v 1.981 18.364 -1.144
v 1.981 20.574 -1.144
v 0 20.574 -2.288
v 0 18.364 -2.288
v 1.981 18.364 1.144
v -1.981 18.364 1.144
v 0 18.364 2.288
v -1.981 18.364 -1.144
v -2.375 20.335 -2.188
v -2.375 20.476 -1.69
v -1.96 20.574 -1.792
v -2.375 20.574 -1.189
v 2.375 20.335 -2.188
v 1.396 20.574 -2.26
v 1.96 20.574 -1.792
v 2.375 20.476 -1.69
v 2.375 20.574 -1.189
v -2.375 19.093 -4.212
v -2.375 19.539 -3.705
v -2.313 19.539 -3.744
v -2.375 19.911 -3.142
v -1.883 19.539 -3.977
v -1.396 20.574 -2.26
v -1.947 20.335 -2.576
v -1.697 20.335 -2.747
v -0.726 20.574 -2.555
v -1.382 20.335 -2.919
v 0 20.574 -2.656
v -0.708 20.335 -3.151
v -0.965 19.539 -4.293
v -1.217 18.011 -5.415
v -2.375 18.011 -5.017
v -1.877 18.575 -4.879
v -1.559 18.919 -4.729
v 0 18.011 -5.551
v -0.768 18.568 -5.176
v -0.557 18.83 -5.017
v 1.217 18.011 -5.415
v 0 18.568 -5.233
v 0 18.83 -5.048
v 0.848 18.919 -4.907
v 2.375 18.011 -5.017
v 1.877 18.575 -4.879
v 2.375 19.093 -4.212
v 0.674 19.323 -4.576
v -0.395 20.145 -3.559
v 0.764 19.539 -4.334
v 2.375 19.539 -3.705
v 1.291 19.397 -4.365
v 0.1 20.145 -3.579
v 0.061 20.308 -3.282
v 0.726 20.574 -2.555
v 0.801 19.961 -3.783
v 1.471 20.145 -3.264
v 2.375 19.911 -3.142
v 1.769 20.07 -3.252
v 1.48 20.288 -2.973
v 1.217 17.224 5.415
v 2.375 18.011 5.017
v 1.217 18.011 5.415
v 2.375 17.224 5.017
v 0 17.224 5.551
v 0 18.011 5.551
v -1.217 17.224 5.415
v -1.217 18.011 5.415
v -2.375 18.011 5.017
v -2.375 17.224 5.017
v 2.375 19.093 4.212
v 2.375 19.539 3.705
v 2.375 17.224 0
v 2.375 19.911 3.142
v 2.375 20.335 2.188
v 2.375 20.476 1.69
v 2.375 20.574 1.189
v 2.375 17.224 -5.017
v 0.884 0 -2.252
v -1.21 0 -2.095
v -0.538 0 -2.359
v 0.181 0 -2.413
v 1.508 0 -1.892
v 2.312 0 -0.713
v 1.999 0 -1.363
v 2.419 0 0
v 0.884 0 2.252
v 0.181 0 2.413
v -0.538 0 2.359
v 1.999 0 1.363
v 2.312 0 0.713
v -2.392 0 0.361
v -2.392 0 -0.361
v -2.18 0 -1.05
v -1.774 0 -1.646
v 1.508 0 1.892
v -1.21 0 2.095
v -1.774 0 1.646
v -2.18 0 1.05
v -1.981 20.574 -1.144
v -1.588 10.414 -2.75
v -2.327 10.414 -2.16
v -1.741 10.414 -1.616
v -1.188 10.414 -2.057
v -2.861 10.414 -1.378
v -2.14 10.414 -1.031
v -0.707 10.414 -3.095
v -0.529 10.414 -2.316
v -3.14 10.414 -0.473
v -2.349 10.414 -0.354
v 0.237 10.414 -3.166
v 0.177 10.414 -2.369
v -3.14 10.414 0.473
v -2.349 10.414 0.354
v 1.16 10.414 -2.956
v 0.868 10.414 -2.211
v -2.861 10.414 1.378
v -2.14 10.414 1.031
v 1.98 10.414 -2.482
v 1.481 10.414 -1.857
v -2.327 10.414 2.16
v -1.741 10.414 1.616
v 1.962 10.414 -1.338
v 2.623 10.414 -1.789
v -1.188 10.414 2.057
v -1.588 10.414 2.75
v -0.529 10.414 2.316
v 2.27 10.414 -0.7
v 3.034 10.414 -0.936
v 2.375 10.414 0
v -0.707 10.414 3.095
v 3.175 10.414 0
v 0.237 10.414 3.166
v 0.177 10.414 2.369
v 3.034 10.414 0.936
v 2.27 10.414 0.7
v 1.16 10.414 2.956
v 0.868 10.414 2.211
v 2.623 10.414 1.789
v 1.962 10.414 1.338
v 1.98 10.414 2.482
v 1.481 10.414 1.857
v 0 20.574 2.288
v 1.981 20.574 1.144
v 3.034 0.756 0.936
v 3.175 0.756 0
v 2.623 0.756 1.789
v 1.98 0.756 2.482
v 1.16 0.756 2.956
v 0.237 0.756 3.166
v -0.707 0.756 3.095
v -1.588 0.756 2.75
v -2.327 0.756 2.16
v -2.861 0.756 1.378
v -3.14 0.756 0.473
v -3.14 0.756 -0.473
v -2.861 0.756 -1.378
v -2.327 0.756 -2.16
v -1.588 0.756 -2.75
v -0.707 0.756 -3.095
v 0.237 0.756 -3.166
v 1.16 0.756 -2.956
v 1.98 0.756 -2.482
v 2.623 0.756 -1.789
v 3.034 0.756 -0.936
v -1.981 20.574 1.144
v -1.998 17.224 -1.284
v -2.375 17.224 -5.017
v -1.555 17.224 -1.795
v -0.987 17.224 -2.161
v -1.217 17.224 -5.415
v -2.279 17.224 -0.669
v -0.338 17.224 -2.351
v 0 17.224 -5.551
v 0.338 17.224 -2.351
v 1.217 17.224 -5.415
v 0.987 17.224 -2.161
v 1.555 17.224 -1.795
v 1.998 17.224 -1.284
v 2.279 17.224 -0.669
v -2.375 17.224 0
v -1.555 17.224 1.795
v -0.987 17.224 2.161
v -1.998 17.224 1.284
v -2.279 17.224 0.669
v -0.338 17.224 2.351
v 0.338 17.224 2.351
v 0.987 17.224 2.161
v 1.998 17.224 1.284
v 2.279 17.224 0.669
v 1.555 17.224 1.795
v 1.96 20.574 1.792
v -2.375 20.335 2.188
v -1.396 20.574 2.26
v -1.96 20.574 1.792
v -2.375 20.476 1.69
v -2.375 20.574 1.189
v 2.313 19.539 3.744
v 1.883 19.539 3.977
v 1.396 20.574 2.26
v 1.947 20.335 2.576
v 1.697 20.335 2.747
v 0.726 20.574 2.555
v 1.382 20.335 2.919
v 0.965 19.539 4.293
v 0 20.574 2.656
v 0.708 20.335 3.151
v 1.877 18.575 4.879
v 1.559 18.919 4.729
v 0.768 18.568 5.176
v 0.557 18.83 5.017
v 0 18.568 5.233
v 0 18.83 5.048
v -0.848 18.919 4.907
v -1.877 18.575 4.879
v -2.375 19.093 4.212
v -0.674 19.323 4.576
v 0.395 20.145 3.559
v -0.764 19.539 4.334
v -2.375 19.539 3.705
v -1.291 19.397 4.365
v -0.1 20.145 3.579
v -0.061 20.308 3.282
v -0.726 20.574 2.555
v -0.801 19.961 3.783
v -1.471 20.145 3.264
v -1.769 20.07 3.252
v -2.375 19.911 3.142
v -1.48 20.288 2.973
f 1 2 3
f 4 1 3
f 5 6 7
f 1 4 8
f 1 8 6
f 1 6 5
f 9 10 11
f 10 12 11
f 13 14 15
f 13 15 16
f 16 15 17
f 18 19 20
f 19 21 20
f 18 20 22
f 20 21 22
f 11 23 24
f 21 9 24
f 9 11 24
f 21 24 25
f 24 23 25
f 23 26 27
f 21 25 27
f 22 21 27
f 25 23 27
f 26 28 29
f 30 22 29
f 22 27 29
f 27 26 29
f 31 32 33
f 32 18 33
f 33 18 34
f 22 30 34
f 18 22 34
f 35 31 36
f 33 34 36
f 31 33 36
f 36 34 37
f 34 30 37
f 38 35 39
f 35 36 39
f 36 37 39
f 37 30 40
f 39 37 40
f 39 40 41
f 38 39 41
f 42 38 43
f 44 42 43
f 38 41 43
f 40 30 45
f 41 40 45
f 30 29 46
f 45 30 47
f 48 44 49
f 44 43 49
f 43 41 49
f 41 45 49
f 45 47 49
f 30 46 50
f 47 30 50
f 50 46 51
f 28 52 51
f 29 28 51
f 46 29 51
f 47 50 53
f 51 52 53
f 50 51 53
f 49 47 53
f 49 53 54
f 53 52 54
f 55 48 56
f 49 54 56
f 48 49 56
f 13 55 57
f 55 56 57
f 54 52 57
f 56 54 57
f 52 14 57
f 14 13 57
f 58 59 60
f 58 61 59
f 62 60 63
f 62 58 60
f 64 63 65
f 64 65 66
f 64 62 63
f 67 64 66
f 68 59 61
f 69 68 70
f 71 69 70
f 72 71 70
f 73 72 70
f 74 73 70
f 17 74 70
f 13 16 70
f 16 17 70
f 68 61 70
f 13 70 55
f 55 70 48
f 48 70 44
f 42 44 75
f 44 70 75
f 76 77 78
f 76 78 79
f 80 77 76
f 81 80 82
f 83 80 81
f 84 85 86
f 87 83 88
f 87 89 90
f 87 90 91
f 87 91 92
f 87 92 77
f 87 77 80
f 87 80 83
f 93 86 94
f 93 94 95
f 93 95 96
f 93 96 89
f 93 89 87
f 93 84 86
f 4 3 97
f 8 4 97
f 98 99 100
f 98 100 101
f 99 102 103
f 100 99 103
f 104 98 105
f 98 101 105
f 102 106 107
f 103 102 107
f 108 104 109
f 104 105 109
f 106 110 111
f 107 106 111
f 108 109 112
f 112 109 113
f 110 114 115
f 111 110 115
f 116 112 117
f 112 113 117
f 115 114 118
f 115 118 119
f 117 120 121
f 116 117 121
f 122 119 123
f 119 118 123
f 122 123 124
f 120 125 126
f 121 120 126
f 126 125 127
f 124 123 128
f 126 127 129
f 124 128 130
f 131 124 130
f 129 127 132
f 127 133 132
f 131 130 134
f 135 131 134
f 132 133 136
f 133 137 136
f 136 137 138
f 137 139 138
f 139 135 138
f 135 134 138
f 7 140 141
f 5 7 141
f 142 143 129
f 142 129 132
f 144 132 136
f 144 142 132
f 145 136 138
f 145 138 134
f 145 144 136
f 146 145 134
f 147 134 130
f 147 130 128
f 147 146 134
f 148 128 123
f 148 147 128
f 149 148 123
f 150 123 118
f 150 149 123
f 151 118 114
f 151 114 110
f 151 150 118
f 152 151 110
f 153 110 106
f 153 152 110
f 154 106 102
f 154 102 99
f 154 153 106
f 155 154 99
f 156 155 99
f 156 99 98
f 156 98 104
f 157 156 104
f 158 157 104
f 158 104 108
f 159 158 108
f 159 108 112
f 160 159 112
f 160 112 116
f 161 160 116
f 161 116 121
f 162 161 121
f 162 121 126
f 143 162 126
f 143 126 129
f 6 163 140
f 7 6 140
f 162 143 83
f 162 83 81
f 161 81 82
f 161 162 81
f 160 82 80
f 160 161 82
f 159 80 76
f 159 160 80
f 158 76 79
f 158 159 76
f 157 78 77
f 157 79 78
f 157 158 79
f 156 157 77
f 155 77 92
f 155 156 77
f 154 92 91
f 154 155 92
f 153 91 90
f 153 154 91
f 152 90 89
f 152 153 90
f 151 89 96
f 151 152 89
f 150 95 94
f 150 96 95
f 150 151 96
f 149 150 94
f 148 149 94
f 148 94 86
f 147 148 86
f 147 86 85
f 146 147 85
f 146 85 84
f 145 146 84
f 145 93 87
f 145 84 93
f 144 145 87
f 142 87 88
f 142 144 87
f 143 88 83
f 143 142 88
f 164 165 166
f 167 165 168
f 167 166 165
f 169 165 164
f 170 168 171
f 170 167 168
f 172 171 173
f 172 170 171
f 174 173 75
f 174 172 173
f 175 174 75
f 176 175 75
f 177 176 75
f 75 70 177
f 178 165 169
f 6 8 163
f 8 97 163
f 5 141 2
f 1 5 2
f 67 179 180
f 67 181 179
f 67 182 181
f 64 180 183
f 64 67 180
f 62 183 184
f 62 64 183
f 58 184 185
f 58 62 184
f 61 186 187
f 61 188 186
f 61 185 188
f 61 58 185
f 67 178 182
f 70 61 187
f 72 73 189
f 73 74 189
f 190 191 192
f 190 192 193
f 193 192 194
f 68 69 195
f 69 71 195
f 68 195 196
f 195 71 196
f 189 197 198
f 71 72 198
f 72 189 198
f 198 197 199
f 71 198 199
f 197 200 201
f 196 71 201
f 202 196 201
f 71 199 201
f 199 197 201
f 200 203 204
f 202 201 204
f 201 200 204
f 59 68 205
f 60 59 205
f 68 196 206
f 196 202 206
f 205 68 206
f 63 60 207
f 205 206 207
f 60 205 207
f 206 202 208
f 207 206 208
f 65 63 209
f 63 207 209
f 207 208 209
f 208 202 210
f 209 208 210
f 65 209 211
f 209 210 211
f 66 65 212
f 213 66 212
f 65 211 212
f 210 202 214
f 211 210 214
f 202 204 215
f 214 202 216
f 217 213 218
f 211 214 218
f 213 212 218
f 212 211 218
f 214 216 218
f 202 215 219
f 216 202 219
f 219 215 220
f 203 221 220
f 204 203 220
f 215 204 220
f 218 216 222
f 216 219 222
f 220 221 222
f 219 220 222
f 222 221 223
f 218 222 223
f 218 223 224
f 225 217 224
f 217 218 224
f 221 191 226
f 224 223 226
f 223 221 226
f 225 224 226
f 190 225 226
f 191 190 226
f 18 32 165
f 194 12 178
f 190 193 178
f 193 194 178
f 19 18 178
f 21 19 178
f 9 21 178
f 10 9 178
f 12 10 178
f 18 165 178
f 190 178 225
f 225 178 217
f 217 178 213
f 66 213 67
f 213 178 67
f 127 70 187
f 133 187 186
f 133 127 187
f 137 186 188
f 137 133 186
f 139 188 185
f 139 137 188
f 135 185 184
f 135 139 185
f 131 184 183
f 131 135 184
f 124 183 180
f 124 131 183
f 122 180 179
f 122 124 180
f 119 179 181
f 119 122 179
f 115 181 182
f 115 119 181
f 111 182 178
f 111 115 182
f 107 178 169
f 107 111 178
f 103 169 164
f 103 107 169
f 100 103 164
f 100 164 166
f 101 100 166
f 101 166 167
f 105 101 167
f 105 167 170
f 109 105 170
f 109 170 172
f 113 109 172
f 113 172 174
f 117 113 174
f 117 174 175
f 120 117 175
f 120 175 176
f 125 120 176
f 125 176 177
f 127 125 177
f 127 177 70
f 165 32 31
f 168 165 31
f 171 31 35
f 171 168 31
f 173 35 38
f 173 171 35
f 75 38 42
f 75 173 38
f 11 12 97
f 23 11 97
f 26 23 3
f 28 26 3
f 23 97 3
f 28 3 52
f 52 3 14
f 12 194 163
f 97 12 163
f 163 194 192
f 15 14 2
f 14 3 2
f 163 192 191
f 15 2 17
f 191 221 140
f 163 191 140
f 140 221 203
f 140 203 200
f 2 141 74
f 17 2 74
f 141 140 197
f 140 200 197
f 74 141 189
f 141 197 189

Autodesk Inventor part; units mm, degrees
sketch "Sketch_1" plane through (0, 0, 0) normal (0, 0, 1) x (1, 0, 0)
  line L0 (0, 0) -> (0, 20.574)
  line L1 (0, 20.574) -> (2.6561, 20.574)
  arc A0 (5.5506, 18.0111) -> (2.6561, 20.574) centre (0.9891, 15.7753) ccw
  line L2 (5.5506, 18.0111) -> (5.5506, 17.2237)
  line L3 (5.5506, 17.2237) -> (2.3752, 17.2237)
  line L4 (2.3752, 17.2237) -> (2.3752, 10.414)
  line L5 (2.3752, 10.414) -> (3.175, 10.414)
  line L6 (3.175, 10.414) -> (3.175, 0.7557)
  line L7 (3.175, 0.7557) -> (2.4194, 0)
  line L8 (2.4194, 0) -> (0, 0)
  line L9 (0, 0) -> (0, 20.574)
revolve "Revolution1" add sketch "Sketch_1" angle 360 about axis through (0, 0, 0) along (0, -1, 0)
thread "Thread1" size "1/4-20 UNC" class "2A" standard "ANSI Unified Screw Threads" full length
sketch "Sketch_2" plane through (0, 20.574, 0) normal (0, 1, 0) x (1, 0, 0)
  line L0 (-7.62, 7.62) -> (-7.62, -7.62)
  line L1 (-7.62, -7.62) -> (7.62, -7.62)
  line L2 (7.62, -7.62) -> (7.62, 7.62)
  line L3 (7.62, 7.62) -> (-7.62, 7.62)
  line L4 (-2.3752, 6.35) -> (-2.3752, -6.35)
  line L5 (-2.3752, -6.35) -> (2.3752, -6.35)
  line L6 (2.3752, -6.35) -> (2.3752, 6.35)
  line L7 (2.3752, 6.35) -> (-2.3752, 6.35)
extrude "Extrusion1" cut sketch "Sketch_2" along normal mid plane 10.16
sketch "Sketch_3" plane through (0, 20.574, 0) normal (0, 1, 0) x (1, 0, 0)
  line L0 (-1.9814, -1.144) -> (0, -2.288)
  line L1 (0, -2.288) -> (1.9814, -1.144)
  line L2 (1.9814, -1.144) -> (1.9814, 1.144)
  line L3 (1.9814, 1.144) -> (0, 2.288)
  line L4 (0, 2.288) -> (-1.9814, 1.144)
  line L5 (-1.9814, 1.144) -> (-1.9814, -1.144)
extrude "Extrusion2" cut sketch "Sketch_3" against normal blind 2.2098
ref_plane "to_a_XY" through (0, 9.6037, 0) normal (0, 1, 0) x (1, 0, 0)
ref_plane "to_a_YZ" through (0, 9.6037, 0) normal (1, 0, 0) x (0, 0, -1)
ref_plane "to_a_ZX" through (0, 9.6037, 0) normal (0, 0, -1) x (0, 1, 0)
properties part number "2059_screw"
